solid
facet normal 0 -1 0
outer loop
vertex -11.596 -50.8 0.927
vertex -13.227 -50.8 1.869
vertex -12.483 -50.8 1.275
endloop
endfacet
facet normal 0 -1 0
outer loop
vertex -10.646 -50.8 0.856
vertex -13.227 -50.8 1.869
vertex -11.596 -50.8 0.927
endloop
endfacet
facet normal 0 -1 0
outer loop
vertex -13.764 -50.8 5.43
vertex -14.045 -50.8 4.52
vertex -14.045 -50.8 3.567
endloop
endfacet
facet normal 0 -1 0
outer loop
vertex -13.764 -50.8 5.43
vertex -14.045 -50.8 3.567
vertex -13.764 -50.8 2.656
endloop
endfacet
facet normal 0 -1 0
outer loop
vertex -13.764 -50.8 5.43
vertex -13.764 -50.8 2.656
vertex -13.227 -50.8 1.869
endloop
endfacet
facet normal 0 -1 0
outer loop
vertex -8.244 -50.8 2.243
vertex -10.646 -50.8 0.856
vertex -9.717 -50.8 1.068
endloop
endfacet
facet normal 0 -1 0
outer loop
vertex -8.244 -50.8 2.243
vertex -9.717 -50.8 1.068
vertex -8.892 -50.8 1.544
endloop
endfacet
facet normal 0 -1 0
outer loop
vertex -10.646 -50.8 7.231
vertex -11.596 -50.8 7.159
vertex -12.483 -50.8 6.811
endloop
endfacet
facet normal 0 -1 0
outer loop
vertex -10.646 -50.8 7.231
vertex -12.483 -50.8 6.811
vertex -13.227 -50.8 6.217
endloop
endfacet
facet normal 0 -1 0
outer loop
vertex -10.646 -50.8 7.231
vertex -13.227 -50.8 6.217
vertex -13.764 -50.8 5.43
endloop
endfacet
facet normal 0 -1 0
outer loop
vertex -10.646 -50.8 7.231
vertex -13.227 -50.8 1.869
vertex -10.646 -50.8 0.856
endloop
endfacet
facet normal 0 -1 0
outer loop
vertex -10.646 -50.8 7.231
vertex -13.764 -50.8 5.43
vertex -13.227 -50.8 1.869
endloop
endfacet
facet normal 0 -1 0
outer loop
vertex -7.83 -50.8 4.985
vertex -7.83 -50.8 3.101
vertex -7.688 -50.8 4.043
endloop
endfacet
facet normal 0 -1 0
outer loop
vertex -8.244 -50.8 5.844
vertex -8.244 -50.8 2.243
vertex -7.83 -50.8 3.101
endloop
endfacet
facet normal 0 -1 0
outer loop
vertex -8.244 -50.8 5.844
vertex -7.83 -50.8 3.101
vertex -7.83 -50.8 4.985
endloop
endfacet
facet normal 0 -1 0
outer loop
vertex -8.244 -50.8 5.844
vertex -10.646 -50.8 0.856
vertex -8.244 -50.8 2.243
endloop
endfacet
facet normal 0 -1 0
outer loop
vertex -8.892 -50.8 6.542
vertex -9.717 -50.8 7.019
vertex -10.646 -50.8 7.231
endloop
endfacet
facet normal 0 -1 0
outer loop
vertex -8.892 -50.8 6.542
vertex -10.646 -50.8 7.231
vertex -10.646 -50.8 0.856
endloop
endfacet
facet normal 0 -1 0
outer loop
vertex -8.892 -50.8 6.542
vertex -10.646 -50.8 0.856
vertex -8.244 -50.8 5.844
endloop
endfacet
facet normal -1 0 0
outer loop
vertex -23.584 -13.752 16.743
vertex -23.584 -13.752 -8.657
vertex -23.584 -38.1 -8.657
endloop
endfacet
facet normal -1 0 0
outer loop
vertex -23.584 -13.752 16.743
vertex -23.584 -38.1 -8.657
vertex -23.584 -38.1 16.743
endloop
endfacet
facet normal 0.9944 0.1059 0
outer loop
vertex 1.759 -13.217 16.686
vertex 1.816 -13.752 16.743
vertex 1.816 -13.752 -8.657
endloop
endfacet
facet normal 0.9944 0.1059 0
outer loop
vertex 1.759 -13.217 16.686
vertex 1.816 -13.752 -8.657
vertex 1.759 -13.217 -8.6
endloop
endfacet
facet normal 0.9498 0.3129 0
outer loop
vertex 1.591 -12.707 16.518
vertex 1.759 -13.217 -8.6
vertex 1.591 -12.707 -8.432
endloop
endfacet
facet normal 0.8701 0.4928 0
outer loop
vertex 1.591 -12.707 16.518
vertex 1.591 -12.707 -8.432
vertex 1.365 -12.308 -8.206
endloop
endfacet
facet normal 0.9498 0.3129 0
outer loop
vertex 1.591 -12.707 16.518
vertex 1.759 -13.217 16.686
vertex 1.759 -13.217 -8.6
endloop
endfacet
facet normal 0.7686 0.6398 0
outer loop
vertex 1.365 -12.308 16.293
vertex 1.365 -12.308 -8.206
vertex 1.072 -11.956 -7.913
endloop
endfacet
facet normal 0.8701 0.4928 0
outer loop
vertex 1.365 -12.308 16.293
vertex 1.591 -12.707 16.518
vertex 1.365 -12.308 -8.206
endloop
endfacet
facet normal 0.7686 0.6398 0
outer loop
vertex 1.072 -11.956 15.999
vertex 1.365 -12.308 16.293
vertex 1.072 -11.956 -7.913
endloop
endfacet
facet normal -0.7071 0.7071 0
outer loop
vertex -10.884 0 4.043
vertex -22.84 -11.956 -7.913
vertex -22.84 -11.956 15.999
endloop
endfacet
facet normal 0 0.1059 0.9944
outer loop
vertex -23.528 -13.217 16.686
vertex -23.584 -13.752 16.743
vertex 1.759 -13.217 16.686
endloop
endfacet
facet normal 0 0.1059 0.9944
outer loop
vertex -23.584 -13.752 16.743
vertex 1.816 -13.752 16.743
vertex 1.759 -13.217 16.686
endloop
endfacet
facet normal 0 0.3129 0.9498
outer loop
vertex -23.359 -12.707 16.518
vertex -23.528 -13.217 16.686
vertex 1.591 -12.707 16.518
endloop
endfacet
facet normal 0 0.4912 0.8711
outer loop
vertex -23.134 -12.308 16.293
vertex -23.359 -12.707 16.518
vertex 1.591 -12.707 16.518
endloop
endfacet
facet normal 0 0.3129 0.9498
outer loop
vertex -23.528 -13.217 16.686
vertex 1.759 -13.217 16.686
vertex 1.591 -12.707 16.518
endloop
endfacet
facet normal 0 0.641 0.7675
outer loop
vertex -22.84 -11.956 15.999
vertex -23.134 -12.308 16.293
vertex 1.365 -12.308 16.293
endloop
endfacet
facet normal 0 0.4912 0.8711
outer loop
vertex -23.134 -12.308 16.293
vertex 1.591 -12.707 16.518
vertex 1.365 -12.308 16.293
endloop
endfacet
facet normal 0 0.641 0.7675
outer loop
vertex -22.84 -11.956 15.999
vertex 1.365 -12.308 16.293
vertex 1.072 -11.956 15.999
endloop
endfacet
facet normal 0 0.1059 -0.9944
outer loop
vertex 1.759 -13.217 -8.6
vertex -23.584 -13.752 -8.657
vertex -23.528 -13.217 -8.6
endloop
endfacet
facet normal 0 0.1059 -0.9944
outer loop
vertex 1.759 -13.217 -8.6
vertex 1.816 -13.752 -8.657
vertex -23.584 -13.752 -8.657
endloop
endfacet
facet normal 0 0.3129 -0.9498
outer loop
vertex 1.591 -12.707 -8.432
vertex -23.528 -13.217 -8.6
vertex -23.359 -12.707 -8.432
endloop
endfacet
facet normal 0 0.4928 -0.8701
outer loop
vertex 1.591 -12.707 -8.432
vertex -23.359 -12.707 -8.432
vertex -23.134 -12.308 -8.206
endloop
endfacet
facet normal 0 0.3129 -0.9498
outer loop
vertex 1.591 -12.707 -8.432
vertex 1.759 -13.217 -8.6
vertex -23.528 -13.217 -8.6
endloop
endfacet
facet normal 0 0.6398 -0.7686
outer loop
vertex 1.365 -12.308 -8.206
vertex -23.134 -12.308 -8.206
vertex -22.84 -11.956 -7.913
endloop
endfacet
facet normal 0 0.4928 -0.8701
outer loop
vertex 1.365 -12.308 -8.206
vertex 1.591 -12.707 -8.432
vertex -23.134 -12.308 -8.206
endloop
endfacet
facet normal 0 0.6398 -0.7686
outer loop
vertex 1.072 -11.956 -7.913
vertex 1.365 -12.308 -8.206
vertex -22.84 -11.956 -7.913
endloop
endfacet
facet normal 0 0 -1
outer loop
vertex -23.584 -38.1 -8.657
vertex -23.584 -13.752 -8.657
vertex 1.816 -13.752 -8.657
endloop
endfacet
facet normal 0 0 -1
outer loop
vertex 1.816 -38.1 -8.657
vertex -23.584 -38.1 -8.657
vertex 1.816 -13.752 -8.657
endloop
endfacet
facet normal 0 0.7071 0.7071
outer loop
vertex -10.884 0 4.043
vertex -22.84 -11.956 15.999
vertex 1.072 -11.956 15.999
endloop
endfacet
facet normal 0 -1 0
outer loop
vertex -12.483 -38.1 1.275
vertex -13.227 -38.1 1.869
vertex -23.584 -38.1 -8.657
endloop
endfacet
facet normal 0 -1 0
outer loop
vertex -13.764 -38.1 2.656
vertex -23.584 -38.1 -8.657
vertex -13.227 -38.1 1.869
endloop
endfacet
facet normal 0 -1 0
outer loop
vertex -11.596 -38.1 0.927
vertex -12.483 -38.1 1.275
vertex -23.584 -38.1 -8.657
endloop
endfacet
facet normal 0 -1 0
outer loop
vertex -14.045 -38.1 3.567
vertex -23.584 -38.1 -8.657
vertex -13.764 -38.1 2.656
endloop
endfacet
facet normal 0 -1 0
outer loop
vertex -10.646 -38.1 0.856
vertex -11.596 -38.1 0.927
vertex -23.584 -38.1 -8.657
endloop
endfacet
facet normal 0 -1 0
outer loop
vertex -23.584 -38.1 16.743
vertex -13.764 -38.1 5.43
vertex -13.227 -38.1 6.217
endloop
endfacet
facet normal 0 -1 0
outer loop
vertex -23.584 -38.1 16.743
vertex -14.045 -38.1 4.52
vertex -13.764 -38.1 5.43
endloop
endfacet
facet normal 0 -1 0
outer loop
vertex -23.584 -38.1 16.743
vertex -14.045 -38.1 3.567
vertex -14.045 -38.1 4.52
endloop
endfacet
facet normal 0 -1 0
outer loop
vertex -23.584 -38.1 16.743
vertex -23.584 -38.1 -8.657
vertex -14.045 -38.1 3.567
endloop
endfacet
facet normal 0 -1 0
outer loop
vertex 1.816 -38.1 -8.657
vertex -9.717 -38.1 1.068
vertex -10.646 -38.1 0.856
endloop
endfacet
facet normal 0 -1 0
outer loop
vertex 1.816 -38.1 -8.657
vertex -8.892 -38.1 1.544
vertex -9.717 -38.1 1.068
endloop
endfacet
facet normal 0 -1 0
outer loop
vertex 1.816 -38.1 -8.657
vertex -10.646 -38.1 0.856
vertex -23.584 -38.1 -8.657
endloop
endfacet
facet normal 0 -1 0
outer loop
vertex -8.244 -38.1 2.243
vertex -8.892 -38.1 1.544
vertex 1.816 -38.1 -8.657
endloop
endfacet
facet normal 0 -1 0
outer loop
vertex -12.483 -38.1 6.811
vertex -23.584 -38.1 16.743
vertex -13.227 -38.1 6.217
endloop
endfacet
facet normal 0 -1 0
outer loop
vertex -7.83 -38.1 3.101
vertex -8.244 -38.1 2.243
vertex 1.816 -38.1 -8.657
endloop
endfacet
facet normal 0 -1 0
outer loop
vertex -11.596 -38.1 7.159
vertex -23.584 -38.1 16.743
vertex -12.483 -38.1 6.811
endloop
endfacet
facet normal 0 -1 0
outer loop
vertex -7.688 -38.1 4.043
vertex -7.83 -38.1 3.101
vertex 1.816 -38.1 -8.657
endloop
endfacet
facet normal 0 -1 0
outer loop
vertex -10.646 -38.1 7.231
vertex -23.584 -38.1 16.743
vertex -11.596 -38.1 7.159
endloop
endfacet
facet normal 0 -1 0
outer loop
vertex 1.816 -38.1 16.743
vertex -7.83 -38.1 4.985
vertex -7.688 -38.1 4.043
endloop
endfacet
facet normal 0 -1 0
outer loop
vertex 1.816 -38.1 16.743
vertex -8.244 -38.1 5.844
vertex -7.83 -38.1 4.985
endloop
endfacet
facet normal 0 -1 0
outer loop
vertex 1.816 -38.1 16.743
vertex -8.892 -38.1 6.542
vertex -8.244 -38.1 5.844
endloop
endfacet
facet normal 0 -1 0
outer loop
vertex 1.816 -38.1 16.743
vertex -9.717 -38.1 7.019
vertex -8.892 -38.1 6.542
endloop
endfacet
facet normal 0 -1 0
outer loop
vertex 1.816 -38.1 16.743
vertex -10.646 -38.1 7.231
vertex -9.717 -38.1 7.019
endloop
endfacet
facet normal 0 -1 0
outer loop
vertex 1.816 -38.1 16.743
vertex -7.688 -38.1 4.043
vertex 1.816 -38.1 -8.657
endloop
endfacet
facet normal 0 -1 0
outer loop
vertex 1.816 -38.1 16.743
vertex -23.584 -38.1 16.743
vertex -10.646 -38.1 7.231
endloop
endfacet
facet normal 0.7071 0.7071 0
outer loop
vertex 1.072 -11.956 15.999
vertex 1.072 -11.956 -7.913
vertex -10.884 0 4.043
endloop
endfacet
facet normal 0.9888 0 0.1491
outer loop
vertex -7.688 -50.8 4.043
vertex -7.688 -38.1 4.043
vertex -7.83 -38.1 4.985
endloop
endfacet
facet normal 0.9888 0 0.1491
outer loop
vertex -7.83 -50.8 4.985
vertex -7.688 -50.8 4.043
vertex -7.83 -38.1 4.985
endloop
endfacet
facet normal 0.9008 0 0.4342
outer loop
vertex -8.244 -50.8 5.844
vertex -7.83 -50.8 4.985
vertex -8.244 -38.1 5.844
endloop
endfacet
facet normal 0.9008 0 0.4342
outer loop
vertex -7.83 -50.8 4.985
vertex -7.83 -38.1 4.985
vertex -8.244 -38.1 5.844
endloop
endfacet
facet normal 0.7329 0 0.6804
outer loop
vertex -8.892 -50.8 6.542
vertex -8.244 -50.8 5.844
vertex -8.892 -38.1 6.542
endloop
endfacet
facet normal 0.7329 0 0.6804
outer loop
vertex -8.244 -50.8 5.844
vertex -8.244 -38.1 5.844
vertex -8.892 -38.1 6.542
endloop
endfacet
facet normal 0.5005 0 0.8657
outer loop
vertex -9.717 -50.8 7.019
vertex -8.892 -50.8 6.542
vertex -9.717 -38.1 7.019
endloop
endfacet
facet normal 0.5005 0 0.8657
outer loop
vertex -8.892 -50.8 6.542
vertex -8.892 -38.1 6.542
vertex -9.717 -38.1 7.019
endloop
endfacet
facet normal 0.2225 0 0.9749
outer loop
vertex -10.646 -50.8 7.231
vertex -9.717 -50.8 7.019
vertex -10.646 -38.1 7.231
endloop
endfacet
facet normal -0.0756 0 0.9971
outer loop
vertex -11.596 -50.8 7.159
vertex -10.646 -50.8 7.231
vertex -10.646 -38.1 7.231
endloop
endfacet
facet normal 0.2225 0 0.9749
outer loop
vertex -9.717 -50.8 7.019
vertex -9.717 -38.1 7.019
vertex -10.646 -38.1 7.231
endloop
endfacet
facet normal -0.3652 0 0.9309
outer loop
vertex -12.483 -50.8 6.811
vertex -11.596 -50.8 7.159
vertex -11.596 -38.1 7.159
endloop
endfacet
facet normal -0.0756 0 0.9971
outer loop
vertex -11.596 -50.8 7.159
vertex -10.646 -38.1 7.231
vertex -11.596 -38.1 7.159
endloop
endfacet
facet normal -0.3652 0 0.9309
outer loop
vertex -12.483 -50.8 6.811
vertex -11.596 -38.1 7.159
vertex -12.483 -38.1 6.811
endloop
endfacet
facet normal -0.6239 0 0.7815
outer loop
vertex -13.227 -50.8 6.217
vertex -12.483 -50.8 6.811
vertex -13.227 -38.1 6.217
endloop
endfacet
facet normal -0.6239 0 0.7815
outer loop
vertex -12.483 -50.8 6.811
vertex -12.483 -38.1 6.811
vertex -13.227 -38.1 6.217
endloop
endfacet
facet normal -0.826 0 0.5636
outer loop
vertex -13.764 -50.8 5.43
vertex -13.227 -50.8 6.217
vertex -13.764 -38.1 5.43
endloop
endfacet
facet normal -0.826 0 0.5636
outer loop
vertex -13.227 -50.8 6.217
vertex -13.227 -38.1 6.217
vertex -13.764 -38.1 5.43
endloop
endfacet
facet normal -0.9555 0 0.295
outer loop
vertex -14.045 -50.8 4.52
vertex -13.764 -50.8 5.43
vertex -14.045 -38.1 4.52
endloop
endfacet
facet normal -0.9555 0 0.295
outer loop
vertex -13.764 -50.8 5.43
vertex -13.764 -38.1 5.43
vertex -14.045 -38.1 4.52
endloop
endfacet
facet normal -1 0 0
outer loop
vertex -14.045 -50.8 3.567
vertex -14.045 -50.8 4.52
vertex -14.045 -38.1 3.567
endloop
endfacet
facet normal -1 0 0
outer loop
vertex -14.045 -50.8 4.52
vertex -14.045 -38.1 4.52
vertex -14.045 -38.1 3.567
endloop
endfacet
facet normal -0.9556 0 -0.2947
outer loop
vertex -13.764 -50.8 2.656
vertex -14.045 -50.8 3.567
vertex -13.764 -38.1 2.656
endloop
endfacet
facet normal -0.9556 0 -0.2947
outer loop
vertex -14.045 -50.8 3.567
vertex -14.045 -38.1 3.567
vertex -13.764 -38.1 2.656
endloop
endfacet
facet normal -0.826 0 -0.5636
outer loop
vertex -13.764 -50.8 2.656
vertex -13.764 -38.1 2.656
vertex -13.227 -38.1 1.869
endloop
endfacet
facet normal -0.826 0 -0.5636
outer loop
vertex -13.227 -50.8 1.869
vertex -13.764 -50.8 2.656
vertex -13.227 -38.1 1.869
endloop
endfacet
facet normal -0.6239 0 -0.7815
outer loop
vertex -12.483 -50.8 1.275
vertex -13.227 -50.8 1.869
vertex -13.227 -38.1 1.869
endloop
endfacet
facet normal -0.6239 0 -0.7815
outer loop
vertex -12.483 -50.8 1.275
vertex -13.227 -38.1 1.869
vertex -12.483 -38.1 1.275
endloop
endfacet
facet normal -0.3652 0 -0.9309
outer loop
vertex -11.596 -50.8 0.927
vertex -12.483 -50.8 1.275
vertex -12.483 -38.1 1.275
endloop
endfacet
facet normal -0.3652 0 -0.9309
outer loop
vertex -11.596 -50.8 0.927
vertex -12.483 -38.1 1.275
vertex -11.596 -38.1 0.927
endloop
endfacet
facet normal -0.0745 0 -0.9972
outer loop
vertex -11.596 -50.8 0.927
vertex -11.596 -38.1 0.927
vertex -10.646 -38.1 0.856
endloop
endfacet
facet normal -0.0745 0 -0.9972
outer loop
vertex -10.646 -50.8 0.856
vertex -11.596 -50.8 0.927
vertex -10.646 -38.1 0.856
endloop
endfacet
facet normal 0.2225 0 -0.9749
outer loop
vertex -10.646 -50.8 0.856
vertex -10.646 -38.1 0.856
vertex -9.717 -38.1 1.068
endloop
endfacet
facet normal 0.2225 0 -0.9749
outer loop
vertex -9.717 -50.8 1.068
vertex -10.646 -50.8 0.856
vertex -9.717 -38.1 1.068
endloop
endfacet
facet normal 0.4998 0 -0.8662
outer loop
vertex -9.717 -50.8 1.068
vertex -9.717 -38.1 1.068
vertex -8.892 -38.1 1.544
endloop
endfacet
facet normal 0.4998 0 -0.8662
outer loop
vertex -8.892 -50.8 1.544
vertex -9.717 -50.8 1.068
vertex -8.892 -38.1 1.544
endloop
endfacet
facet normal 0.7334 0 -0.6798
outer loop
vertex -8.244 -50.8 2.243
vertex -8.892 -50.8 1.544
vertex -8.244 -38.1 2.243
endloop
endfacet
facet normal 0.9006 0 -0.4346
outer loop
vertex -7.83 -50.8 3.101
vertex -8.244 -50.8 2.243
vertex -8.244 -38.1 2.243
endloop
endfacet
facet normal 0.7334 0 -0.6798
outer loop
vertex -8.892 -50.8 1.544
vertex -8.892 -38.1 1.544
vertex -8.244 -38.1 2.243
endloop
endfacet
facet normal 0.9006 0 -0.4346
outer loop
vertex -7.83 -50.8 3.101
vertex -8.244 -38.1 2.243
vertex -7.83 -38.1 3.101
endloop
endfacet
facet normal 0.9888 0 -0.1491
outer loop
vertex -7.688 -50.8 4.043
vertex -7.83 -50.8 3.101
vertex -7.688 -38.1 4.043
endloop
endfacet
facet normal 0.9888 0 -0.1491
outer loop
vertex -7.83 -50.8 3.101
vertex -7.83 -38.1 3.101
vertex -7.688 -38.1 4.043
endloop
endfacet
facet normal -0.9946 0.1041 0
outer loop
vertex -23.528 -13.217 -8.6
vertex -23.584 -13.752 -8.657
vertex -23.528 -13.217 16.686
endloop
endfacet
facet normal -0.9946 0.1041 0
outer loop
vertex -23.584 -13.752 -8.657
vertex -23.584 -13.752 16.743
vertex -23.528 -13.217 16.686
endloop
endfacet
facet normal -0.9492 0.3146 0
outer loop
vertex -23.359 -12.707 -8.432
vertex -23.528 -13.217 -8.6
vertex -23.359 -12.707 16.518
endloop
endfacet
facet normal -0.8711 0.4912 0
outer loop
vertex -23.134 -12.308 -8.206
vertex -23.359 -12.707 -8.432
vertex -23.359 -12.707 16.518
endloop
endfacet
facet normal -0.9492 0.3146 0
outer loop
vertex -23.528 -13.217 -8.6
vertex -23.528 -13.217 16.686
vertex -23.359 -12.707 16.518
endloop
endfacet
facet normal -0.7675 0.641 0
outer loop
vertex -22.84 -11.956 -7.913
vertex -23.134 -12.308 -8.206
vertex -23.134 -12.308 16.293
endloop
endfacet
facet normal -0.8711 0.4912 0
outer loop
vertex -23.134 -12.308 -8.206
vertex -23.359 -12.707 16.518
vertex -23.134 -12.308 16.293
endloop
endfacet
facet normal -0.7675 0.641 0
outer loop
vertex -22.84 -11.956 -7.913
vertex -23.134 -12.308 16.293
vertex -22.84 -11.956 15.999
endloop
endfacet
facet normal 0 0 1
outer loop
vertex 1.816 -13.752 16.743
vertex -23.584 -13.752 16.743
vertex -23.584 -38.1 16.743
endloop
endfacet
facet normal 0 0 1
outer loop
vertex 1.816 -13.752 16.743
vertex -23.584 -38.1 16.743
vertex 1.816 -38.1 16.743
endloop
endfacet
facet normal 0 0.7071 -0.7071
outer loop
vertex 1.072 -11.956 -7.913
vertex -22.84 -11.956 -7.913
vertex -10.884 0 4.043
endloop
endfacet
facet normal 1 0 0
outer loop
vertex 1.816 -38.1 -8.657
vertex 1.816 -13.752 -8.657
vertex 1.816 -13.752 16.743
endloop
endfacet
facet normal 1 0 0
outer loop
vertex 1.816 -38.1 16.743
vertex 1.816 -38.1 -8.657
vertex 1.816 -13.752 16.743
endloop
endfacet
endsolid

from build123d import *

# Parameters (mm, degrees)
F0_W     = 25.4
F0_H     = 25.4
F1_DEPTH = 38.1
F2_R     = 3.1962081395
F3_DEPTH = 12.7
F4_SIZE  = 12.69999
F5_R     = 2.54


# Not quite as in the source:
# - a fillet or chamfer is up to 0.001 mm smaller than in the source, because OpenCascade refuses the exact size


with BuildPart() as f1:
    # F0 (on Front) → F1 (new body)
    with BuildSketch(Plane.XZ):
        with Locations((-10.8844147762, 4.0432729903)):
            Rectangle(F0_W, F0_H)
    extrude(amount=F1_DEPTH)

    # F2 (on face) → F3 (join)
    with BuildSketch(Plane.XZ.offset(38.1)):
        with Locations((-10.8844147762, 4.0432729903)):
            Circle(F2_R)
    extrude(amount=F3_DEPTH)

    # F4 (size 12.7 in the source; OpenCascade refuses exactly that, so slightly less here)
    f4_edges = [f1.edges().sort_by_distance(p)[0] for p in [
        (-10.884415, 0, 16.743273),
        (-10.884415, 0, -8.656727),
        (1.815585, 0, 4.043273),
        (-23.584415, 0, 4.043273),
    ]]
    chamfer(f4_edges, length=F4_SIZE)

    # F5
    f5_edges = [f1.edges().sort_by_distance(p)[0] for p in [
        (-23.584415, -12.69999, 4.043273),
        (-10.884415, -12.69999, 16.743273),
        (1.815585, -12.69999, 4.043273),
        (-10.884415, -12.69999, -8.656727),
    ]]
    fillet(f5_edges, radius=F5_R)


solid = f1.part
